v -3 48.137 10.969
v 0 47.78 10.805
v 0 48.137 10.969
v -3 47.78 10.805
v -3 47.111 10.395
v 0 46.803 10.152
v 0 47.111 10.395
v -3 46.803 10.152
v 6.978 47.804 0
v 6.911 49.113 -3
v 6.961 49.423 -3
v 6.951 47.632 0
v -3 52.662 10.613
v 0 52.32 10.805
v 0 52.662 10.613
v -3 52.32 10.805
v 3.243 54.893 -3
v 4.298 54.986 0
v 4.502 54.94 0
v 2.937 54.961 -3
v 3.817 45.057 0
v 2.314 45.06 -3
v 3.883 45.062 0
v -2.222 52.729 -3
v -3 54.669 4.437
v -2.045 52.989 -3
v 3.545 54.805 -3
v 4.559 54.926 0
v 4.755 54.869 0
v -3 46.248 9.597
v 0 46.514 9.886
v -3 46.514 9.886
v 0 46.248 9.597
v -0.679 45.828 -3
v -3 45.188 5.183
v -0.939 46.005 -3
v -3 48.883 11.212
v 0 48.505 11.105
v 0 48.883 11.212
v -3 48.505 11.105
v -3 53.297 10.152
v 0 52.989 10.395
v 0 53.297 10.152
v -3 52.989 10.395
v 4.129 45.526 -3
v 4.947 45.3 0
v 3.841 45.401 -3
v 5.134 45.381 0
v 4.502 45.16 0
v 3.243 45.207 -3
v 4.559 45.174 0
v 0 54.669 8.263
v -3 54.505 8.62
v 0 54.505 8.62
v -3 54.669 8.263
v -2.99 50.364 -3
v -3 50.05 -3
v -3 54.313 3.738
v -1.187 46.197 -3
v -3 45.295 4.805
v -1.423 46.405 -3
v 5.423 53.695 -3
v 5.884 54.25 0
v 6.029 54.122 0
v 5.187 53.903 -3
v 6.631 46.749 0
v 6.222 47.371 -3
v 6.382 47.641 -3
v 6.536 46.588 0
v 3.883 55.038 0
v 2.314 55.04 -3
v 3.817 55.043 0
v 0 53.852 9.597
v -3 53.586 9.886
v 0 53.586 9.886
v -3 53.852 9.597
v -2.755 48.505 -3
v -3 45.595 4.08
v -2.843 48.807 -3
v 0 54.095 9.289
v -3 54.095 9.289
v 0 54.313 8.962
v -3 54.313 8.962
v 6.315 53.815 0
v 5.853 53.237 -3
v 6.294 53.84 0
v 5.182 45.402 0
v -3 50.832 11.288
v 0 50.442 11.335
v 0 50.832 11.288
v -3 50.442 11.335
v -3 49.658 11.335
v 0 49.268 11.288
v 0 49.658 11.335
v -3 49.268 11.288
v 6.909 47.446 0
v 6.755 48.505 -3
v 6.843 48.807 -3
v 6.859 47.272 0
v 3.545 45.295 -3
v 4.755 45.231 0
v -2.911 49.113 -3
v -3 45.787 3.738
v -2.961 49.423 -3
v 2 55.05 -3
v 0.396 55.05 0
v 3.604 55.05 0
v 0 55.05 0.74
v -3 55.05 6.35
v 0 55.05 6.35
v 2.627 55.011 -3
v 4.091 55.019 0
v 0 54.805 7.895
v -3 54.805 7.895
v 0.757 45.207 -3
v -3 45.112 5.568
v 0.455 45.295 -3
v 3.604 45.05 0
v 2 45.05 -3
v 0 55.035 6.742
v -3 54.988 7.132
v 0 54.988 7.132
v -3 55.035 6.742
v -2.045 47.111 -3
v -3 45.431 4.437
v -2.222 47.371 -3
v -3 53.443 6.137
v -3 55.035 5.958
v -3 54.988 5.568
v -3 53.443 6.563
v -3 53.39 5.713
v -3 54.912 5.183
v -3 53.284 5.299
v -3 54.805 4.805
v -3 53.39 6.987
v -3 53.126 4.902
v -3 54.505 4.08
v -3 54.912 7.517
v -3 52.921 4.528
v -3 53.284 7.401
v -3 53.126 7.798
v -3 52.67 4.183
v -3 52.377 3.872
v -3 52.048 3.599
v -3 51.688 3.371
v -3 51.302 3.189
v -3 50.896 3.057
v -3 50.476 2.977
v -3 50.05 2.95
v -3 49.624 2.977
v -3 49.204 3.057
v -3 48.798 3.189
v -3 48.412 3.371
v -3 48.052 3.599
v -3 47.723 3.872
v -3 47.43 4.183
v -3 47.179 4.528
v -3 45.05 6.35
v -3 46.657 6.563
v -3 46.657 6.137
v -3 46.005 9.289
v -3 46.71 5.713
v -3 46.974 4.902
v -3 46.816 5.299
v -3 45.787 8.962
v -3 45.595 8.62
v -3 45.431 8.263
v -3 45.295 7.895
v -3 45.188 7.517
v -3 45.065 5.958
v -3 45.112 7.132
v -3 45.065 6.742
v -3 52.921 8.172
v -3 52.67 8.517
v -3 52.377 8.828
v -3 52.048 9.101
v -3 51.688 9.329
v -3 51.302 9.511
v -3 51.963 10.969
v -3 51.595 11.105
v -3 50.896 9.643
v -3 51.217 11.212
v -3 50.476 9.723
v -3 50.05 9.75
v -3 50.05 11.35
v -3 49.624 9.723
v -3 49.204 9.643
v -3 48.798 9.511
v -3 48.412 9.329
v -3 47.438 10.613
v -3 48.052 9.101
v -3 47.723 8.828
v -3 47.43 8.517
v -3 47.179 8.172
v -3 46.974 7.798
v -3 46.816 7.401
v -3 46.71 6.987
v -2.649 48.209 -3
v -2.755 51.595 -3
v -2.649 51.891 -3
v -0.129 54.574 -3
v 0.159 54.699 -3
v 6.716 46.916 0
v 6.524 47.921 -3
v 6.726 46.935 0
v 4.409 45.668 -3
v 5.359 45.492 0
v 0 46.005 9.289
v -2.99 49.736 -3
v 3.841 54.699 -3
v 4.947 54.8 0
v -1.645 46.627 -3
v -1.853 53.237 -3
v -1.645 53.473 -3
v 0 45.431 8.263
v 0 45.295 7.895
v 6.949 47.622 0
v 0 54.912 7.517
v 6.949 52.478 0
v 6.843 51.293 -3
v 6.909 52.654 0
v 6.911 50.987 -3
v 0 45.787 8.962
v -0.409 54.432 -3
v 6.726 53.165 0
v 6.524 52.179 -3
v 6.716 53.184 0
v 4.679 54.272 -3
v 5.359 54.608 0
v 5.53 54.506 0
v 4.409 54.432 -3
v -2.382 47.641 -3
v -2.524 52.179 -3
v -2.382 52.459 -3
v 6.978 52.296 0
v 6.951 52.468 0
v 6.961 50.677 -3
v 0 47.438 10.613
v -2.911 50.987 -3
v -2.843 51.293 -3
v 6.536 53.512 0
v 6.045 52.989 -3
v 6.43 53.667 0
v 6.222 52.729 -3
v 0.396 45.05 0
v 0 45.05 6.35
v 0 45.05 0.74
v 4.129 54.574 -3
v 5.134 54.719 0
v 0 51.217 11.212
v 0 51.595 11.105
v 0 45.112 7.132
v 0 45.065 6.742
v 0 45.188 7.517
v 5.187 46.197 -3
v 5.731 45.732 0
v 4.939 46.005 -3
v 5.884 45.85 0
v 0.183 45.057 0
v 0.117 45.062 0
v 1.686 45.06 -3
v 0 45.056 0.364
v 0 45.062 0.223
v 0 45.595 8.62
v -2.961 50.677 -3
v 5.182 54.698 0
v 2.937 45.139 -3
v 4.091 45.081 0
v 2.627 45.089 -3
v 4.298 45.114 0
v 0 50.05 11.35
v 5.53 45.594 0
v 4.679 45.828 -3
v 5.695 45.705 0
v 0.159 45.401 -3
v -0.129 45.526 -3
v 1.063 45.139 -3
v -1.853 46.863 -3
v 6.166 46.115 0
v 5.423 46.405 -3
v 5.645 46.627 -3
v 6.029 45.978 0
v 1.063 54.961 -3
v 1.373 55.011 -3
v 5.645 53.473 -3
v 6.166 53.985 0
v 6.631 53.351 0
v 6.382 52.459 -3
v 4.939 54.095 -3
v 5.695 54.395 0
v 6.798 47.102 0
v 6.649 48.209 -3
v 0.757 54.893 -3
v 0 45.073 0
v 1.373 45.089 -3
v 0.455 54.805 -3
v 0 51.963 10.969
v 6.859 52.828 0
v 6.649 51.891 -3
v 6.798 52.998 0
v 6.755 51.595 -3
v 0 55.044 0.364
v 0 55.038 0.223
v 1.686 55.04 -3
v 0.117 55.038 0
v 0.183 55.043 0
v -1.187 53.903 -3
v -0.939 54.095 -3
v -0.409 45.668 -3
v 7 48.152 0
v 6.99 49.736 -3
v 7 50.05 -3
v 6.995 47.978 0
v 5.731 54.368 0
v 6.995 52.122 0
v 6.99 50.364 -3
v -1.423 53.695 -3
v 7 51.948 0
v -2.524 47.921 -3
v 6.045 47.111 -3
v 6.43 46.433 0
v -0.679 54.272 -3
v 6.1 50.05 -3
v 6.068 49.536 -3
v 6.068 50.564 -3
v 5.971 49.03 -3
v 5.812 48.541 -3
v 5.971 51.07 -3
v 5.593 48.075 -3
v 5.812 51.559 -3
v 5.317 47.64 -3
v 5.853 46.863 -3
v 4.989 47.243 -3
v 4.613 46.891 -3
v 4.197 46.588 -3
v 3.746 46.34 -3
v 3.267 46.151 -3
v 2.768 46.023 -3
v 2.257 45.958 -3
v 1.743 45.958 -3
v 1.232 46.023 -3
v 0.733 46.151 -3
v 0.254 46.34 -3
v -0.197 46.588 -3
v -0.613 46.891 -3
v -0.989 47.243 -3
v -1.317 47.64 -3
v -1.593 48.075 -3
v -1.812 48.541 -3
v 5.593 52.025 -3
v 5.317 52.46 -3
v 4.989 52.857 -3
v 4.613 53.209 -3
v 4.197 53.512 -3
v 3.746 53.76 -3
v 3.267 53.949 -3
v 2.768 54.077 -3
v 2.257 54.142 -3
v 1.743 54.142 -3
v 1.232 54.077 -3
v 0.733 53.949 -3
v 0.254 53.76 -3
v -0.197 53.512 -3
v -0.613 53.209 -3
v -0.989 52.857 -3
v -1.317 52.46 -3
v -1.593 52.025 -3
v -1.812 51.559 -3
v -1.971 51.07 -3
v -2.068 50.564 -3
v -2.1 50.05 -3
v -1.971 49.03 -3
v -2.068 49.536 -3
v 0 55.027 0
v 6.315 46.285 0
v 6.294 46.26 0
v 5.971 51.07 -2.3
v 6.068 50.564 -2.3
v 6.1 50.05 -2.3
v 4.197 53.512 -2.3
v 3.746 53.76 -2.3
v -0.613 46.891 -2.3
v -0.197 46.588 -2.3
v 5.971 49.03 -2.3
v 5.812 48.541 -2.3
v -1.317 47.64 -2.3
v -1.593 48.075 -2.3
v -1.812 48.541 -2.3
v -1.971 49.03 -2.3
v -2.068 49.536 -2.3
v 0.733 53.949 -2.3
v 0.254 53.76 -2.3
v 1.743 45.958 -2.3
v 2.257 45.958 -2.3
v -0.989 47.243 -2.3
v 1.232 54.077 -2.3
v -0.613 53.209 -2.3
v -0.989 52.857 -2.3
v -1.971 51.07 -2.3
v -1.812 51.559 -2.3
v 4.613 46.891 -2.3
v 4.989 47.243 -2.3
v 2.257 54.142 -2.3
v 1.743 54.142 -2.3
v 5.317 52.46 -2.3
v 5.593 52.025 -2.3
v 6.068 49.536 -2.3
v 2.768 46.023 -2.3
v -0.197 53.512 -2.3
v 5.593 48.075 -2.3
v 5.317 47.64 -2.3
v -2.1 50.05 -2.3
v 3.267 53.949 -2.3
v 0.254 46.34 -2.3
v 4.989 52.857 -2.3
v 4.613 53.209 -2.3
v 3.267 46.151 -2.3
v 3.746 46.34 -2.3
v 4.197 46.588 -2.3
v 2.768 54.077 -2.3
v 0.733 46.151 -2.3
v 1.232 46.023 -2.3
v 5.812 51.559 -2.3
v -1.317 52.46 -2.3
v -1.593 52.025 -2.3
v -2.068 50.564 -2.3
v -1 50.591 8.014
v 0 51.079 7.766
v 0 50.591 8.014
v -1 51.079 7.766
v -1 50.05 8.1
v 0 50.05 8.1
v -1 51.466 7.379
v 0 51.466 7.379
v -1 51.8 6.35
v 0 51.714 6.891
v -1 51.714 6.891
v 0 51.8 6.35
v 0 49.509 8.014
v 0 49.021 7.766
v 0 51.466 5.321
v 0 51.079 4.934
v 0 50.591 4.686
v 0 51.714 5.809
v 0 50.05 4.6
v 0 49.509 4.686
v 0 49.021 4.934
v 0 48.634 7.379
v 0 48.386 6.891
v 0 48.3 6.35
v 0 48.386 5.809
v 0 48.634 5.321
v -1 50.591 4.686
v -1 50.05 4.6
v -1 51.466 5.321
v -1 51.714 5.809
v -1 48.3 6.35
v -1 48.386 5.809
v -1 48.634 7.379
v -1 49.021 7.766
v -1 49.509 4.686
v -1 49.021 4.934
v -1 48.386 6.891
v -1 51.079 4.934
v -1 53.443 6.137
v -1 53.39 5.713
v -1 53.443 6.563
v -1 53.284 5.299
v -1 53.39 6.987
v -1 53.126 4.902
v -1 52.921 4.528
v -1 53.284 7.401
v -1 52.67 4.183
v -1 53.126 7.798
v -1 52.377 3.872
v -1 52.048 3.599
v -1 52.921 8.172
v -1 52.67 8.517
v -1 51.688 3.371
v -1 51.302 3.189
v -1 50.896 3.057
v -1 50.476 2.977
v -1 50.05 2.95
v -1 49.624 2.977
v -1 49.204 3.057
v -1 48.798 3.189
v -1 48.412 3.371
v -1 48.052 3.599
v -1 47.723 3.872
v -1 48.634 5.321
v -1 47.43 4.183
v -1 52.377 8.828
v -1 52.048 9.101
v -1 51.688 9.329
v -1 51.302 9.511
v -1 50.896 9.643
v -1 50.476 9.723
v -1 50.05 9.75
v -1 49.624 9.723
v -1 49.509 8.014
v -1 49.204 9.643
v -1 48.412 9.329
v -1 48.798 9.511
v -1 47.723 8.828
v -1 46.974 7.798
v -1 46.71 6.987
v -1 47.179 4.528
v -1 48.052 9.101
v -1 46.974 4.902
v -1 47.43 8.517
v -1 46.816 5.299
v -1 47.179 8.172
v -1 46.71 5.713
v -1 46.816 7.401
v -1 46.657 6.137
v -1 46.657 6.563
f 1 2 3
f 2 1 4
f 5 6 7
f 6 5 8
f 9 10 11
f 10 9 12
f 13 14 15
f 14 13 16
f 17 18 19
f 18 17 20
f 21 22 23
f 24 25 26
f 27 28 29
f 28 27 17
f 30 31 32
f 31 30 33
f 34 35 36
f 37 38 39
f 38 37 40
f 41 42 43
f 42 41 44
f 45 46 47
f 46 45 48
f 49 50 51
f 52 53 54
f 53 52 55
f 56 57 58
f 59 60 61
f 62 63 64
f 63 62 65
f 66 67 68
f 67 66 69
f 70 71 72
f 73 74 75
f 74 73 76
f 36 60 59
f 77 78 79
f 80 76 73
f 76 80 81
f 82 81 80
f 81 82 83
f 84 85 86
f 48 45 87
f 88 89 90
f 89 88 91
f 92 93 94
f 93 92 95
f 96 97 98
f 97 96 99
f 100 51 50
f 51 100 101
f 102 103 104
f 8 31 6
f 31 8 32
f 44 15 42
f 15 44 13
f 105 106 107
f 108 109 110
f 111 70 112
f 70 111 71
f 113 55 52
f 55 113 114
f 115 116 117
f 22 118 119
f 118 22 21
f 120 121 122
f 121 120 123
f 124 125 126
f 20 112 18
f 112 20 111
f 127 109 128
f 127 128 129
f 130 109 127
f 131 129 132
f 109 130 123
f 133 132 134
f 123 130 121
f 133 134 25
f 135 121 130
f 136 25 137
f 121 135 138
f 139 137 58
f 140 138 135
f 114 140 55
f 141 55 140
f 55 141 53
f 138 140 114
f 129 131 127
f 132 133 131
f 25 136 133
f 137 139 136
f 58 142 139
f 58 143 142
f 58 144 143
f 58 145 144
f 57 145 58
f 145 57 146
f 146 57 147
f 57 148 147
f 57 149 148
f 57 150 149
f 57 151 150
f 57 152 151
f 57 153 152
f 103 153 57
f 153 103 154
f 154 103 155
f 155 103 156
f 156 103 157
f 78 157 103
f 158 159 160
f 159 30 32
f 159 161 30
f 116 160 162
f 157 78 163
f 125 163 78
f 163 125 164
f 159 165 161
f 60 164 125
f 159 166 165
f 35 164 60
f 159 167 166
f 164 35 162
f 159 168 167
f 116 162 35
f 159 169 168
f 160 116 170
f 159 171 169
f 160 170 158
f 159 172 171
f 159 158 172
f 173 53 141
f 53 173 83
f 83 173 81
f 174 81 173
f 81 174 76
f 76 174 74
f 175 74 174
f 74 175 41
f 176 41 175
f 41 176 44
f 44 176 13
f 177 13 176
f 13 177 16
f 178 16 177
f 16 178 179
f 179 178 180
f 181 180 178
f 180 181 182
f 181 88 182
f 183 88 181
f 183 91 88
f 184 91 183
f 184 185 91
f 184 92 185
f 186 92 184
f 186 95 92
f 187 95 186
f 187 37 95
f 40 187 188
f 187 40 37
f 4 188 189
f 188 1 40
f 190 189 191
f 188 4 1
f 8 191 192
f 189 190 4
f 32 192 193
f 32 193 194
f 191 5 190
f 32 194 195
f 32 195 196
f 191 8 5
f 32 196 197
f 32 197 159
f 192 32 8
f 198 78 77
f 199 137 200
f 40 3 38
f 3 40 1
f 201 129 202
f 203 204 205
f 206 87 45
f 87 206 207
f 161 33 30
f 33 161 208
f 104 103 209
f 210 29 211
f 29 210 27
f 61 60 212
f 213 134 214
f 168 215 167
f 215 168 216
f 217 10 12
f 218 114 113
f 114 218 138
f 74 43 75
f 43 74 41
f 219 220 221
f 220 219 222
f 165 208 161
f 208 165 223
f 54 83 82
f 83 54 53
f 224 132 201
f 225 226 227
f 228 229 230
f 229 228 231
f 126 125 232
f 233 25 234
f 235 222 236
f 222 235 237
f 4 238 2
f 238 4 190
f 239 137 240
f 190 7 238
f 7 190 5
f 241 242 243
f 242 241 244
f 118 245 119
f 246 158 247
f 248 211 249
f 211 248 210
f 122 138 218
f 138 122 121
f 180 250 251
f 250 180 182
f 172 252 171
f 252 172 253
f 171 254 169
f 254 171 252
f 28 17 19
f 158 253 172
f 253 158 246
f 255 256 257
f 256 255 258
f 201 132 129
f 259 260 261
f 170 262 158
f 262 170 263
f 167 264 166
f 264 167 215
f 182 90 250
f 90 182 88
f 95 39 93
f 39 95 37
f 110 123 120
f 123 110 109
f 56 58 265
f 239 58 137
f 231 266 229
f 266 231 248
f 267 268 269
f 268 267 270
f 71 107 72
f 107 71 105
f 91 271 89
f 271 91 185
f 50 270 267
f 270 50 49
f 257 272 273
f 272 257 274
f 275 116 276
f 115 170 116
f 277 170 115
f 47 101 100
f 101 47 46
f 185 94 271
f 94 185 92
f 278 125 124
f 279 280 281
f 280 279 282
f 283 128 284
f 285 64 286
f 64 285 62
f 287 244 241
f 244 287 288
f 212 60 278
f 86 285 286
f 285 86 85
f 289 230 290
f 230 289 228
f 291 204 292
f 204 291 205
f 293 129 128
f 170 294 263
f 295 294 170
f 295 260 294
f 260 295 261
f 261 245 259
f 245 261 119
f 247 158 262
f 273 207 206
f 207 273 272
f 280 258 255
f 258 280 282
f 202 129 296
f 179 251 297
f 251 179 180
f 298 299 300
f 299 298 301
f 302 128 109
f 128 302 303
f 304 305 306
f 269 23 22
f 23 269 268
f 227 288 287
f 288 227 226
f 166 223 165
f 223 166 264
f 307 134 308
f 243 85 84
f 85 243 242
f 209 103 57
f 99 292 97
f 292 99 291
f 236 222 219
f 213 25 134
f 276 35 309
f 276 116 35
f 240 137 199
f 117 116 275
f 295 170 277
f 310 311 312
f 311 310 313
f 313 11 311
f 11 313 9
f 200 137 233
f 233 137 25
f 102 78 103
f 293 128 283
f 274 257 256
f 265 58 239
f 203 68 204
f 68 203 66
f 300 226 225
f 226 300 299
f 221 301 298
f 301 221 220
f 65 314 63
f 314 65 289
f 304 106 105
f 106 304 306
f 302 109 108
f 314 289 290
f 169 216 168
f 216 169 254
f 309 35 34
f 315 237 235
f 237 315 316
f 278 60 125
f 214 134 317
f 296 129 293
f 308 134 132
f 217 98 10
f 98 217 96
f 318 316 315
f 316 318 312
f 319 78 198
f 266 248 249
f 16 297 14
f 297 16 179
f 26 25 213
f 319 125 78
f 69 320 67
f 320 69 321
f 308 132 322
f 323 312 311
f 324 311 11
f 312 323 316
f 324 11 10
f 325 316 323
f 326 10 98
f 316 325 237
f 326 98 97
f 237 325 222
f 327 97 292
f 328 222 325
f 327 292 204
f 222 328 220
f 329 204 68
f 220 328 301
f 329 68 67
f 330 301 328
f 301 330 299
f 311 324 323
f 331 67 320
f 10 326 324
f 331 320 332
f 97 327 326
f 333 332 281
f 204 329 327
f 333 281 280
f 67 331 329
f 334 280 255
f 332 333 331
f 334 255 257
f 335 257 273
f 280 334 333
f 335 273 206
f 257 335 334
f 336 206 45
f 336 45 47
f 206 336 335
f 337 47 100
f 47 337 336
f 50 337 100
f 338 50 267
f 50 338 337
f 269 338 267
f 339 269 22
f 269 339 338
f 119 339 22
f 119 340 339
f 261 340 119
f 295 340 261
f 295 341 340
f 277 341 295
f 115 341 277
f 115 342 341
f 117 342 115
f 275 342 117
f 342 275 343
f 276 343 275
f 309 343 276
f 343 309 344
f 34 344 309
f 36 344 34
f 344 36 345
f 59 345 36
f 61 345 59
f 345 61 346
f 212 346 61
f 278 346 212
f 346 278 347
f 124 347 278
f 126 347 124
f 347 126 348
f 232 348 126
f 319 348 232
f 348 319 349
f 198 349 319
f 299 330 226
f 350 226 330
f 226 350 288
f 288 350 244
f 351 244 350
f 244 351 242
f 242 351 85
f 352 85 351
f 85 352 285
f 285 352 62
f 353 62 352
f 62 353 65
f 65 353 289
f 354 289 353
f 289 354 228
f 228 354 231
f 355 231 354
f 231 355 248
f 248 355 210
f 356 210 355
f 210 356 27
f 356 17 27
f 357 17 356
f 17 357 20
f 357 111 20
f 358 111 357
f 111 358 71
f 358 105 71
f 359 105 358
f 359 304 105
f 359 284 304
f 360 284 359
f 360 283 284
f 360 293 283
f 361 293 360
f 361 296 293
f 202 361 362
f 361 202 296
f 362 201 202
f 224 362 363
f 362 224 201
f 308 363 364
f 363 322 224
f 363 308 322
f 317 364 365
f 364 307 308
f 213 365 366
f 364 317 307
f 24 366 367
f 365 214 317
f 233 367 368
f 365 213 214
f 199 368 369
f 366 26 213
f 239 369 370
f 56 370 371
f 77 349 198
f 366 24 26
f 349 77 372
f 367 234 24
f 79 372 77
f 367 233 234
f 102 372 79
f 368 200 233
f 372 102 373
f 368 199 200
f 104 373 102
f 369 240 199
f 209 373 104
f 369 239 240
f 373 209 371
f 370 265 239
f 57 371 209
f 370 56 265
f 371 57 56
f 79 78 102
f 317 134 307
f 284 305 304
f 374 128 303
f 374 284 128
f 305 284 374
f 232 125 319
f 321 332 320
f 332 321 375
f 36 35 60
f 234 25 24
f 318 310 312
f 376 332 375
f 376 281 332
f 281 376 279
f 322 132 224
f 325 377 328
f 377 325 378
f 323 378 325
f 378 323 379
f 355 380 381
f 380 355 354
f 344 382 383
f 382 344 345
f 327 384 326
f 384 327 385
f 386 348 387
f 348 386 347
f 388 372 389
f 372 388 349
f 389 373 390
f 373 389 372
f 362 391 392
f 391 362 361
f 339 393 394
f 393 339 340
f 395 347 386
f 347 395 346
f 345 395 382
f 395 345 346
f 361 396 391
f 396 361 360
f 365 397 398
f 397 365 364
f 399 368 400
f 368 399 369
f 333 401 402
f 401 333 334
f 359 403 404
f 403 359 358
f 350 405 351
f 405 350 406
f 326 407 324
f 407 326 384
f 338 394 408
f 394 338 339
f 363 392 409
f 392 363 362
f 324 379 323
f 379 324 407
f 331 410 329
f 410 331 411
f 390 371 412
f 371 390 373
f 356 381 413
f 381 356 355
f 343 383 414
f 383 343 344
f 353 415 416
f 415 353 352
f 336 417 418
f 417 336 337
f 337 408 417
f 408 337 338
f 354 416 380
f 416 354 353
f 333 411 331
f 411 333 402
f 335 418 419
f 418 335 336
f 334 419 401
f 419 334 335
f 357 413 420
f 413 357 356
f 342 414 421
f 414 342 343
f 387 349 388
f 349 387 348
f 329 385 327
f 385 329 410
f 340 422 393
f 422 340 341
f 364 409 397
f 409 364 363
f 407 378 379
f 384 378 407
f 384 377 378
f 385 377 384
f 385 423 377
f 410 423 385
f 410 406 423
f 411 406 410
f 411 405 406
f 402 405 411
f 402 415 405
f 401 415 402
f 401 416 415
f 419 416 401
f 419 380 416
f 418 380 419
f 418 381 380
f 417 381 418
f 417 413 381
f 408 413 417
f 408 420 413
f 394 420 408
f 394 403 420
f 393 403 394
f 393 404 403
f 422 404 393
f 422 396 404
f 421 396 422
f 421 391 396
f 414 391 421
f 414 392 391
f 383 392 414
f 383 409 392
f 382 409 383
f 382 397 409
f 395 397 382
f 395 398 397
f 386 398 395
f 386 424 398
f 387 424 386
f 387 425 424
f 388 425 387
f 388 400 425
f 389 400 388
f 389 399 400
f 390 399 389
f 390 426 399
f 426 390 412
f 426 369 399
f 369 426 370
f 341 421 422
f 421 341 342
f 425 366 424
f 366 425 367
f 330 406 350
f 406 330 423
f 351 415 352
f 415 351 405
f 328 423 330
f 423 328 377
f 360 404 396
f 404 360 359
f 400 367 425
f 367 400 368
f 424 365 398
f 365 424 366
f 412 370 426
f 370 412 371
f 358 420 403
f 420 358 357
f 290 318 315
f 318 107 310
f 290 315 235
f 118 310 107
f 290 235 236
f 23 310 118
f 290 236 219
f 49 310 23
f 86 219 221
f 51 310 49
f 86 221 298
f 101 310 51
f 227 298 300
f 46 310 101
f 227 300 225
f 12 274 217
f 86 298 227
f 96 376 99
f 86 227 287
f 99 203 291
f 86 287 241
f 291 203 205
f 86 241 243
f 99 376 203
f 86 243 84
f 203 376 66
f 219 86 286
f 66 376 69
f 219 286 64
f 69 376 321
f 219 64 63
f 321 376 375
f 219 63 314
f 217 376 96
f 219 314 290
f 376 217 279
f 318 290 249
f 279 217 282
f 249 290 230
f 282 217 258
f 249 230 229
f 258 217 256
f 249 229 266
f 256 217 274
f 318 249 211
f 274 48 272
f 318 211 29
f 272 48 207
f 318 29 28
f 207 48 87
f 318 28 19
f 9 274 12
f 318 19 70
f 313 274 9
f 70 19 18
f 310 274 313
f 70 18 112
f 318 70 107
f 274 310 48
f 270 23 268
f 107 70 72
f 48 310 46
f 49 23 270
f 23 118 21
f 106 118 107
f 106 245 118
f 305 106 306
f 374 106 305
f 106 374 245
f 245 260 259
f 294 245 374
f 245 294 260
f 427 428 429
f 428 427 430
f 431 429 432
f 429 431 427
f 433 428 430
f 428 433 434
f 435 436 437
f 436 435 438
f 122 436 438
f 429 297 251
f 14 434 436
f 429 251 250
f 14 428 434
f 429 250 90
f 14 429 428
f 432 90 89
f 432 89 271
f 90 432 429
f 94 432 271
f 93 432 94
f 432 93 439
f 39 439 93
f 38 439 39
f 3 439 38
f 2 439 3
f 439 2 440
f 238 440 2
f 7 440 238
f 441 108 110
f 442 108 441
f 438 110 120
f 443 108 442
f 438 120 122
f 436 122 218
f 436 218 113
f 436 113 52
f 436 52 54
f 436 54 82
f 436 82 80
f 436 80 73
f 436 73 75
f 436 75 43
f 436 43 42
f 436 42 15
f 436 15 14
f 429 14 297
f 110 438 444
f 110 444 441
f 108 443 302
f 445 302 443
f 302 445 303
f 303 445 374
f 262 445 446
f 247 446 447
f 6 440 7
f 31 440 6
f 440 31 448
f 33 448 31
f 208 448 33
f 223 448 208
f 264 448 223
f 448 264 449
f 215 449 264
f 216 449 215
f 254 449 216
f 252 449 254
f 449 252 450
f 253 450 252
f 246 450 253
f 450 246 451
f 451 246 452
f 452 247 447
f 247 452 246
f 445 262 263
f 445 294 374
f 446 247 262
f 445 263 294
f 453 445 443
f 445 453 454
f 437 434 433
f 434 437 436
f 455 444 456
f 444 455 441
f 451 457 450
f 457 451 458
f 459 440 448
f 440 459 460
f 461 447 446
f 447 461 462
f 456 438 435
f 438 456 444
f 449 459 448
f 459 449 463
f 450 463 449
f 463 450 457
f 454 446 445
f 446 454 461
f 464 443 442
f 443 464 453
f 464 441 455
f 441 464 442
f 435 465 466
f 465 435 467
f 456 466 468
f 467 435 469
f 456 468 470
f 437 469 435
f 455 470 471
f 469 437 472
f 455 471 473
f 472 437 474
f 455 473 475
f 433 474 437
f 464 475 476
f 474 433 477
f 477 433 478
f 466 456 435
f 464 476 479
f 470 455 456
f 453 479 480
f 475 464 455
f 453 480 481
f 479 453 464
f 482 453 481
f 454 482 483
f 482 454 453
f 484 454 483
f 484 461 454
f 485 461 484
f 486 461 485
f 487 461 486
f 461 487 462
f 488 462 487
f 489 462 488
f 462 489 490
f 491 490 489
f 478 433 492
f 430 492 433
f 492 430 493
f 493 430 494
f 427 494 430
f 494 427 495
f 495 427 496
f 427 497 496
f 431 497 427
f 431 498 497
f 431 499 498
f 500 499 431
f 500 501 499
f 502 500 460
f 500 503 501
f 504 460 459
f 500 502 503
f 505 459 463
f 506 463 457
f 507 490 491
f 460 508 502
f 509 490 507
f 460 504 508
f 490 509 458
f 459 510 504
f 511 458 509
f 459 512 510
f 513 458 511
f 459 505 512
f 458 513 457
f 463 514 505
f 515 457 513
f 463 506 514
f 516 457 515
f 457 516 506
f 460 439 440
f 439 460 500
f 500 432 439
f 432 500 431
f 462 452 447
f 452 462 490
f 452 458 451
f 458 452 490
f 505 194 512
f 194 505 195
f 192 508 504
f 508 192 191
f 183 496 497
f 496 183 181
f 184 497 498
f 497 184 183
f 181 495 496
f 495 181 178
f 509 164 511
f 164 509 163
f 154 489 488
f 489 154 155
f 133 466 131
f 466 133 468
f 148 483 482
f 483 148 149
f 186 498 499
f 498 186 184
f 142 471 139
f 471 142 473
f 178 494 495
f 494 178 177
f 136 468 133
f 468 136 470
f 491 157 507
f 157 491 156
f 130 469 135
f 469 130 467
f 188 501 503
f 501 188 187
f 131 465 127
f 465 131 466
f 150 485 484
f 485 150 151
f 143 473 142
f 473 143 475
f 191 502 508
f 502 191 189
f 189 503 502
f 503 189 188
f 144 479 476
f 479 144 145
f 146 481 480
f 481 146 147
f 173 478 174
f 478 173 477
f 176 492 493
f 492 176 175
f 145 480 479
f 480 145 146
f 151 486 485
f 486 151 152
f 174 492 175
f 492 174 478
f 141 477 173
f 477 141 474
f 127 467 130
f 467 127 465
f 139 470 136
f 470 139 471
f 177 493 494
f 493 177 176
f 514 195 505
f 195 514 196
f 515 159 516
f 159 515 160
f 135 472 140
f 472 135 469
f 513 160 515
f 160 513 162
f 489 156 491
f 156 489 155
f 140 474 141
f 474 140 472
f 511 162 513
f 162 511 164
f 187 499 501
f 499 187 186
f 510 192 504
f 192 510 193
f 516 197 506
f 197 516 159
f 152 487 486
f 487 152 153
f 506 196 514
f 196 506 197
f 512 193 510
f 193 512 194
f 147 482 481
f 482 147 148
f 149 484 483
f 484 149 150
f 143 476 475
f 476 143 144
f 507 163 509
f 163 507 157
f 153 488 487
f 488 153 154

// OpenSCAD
// From: SFF-8301 3.5" Form Factor Drive Dimensions
// https://members.snia.org/document/dl/25861
// https://support.wdc.com/images/kb/2579-771970-A03.pdf
// a[1] = 17.8 or 26.1 or 42
$hdd__a = [0, 26.1,  147,   101.6, 95.25, 3.18,
              44.45, 41.28, 28.5,  101.6, 6.35,
              0.25,  0.5,   76.2];
$hdd__de_facto_side_hole = 41.61;
$hdd__width = $hdd__a[3];
$hdd__length = $hdd__a[2];
$hdd__height = $hdd__a[1];

$jms578__z_offset = -0.5;
$jms578__sata = [43, 2, 5 + 0.1];
$jms578__sata_x_margin = 0.9;
$jms578__pcb = [56, 20-2, 1];
$jms578__cable_ext = 2;
$jms578__cable_y = 7;
$jms578__cable_d = 6 + 0.1;

thickness = 1.00001;
height = 20;
jms578_x_margin = 8.5 - $jms578__sata_x_margin;
x_size = jms578_x_margin + $jms578__pcb[0] + $jms578__cable_ext;
y_thickness = 5 - ($jms578__cable_y - 7.1/2);
y_size = $jms578__pcb[1] + $jms578__sata[1] + y_thickness;
power_hole_d = 8;

/****** ******/
//part_a();
//part_b();
part_c();
/****** ******/

module part_a() adapter_box("top");
module part_b() adapter_box("bottom");
module part_c() {
    hdd_mount();
}

module adapter_box(piece = "top") {
    z_offset = $jms578__z_offset;
    pcb = $jms578__pcb;
    sata = $jms578__sata;

    translate([0, 0, sata[2]/2 + z_offset])
    intersection() {
        if (piece == "top")  {
            translate([-100, -100]) cube([200, 200, 200]);
        } else if (piece == "bottom") {
            mirror([0, 0, 1]) translate([-100, -100]) cube([200, 200, 200]);
        } else if (piece == "void") {
        } else {
            echo(piece = piece);
            assert(false, "piece must be top or bottom");
        }
        if (piece == "void") {
            hull() adapter_box_raw();
        } else {
            adapter_box_raw();
        }
    }
}

module adapter_box_raw() {
    z_offset = $jms578__z_offset;
    pcb = $jms578__pcb;
    sata = $jms578__sata;

    screw_length = 20;
    screw_mount_height = -z_offset + height - screw_length + 5;
    
    module jms578_mount_void() difference() {
        hull() jms578_mount_raw();
        jms578_mount_raw();
    }

    module screw() cylinder(d = 3, h = sata[2]/2+thickness, $fn = 6);
    module screw_top() cylinder(d = 3.1, h = height, $fn = 20);

    translate([0, 0, 0]) difference() {
        translate([0, 0, -sata[2]/2-thickness]) linear_extrude(height = height) {
            square([x_size, y_size]);
                
            translate([jms578_x_margin + pcb[0], 0]) {
                square([5, 5]);
                translate([0, y_size - 5]) square([5, 5]);
            }
        }
        translate([jms578_x_margin, y_thickness]) {
            jms578_mount_void();
             difference() {
                translate([-4, 0]) cube([pcb[0], pcb[1], height - (sata[2]/2 + thickness) - thickness]);
                translate([28, 13, 0]) {
                    cylinder(d = 2, h = 99, $fn = 20);
                    translate([-4/2, -4/2]) cube([4, 99, 99]);
                }
                //translate([pcb[0]-4, $jms578__cable_y]) translate([0, -9/2]) cube([99, 9, 99]);
            }
            translate([28, 13, 0]) {
                cylinder(d = 2, h = 99, $fn = 20);
                translate([-2/2, -2/2]) cube([2, 2, height-sata[2]/2-thickness*2]);
            }
        }
        translate([0, 0, -sata[2]/2-thickness]) {
            translate([5/2, y_size - 5/2, 0]) screw();
            translate([5/2, 5/2]) screw();
            translate([jms578_x_margin + pcb[0] + 5/2, y_size - 5/2, 0]) screw();
            translate([jms578_x_margin + pcb[0] + 5/2, 5/2]) screw();
        }
        translate([0, 0, 0]) {
            translate([5/2, y_size - 5/2, 0]) screw_top();
            translate([5/2, 5/2]) screw_top();
            translate([jms578_x_margin + pcb[0] + 5/2, y_size - 5/2, 0]) screw_top();
            translate([jms578_x_margin + pcb[0] + 5/2, 5/2]) screw_top();
        }
        // power hole
        translate([10, pcb[1], (height-sata[2]/2-thickness)/2]) rotate([90, 0]) cylinder(d = power_hole_d, h = 99, $fn = 100);
    }
}

module jms578_mount_raw() {
    z_offset = $jms578__z_offset;
    sata = $jms578__sata;
    sata_x_margin = $jms578__sata_x_margin;
    pcb = $jms578__pcb;
    cable_ext = $jms578__cable_ext;
    cable_y = $jms578__cable_y;
    cable_d = $jms578__cable_d;
    
    screw_h = (sata[2] - pcb[2])/2 + thickness;
    screw_d = 2.3;
    screw_mount_offset = pcb[2] / 2;
    // 8 2 6

    module screw_hole() cylinder(d = screw_d, h = screw_h);
    
    module screw_mount() difference() {
        cylinder(d = screw_d + 1*2, h = screw_h, $fn = 20);
        cylinder(d = screw_d, h = screw_h);
    }

    difference() {
        translate([0, 0, -thickness - sata[2]/2])
            cube([pcb[0]+cable_ext, pcb[1]+sata[1], thickness*2 + sata[2]]);
        translate([pcb[0], cable_y, 0]) rotate([0, 90]) cylinder(d = cable_d, h = cable_ext, $fn = 30);
        translate([0, 0, -sata[2]/2]) cube([pcb[0], pcb[1], sata[2]]);
        //translate([0, 0, screw_h + pcb[2]/2]) cube([pcb[0] + 2, pcb[1], 1]);
        translate([sata_x_margin, pcb[1], -sata[2]/2]) cube(sata);
        mirror([0, 0, 1]) translate([0, 0, screw_mount_offset]) {
            translate([3, 7]) screw_hole();
            translate([48, 13]) screw_hole();
        }
        
        // LED hole
        translate([28, 13, 0]) cylinder(d = 2, h = 99, $fn = 20);
    }
    
    mirror([0, 0, 1]) translate([0, 0, screw_mount_offset]) {
        translate([3, 7]) screw_mount();
        translate([48, 13]) screw_mount();
    }
}

module hdd_void() {
    a = $hdd__a;
    de_facto_side_hole = $hdd__de_facto_side_hole;
    width = $hdd__width;
    length = $hdd__length;
    height = $hdd__height;
    
    screw_d = 3.5;
    screw_h = 1;
    screw_head_d = 6.8;
    screw_head_h = 10;
    cube([a[3], a[2], a[1]]);
    
    module screw() {
        cylinder(d = screw_d, h = screw_h, $fn = 20);
        translate([0, 0, screw_h]) cylinder(d = screw_head_d, h = screw_head_h, $fn = 50);
    }
    module bottom_screw() rotate([180, 0, 0]) screw();
    translate([a[5], a[7]]) bottom_screw();
    translate([a[5], a[7] + a[6]]) bottom_screw();
    translate([a[5], a[7] + a[13]]) bottom_screw();
    translate([a[5] + a[4], a[7]]) bottom_screw();
    translate([a[5] + a[4], a[7] + a[6]]) bottom_screw();
    translate([a[5] + a[4], a[7] + a[13]]) bottom_screw();
    
    module left_screw() translate([0, 0, a[10]]) rotate([0, -90, 0]) screw();
    translate([0, a[8], 0]) left_screw();
    translate([0, a[8] + de_facto_side_hole, 0]) left_screw();
    translate([0, a[8] + a[9], 0]) left_screw();
    module right_screw() translate([width, 0, a[10]]) rotate([0, 90, 0]) screw();
    translate([0, a[8], 0]) right_screw();
    translate([0, a[8] + de_facto_side_hole, 0]) right_screw();
    translate([0, a[8] + a[9], 0]) right_screw();
}

module hdd_mount() {
    a = $hdd__a;
    width = $hdd__width;
    length = $hdd__length;
    height = $hdd__height;
    
    x_thickness = 3;
    y_thickness = 3;
    locator_thickness = 1;
    rubber_feet_d = 8 + 0.2;
    rubber_feet_h = 0.7;

    module foot() translate([10/2-x_thickness, 0, 0]) difference() {
        hull() {
            translate([10/2, 0, a[10]]) rotate([0, -90, 0]) cylinder(d = 10, h = 10, $fn = 80);
            translate([0, 0, -y_thickness]) cylinder(d = 10, h = 1, $fn = 100);
        }
        translate([0, 0, -y_thickness]) cylinder(d = rubber_feet_d, h = rubber_feet_h, $fn = 50);
    }

    difference() {
        union() {
            /*translate([-locator_thickness, -locator_thickness, -y_thickness])
                cube([5, 5, 1 + 5]);
            translate([0, 0, -y_thickness]) cube([5 - locator_thickness, y_size + a[8] -10/2, 5]);
            */
            translate([0, y_size]) translate([0, a[8], 0]) foot();
            //translate([0, y_size]) translate([0, a[8] + a[9], 0]) foot();
            //translate([0, y_size]) translate([width, a[8], 0]) mirror([1, 0]) foot();
        }
        #translate([0, y_size]) hdd_void();
        #hull() adapter_box("bottom");
    }
}
